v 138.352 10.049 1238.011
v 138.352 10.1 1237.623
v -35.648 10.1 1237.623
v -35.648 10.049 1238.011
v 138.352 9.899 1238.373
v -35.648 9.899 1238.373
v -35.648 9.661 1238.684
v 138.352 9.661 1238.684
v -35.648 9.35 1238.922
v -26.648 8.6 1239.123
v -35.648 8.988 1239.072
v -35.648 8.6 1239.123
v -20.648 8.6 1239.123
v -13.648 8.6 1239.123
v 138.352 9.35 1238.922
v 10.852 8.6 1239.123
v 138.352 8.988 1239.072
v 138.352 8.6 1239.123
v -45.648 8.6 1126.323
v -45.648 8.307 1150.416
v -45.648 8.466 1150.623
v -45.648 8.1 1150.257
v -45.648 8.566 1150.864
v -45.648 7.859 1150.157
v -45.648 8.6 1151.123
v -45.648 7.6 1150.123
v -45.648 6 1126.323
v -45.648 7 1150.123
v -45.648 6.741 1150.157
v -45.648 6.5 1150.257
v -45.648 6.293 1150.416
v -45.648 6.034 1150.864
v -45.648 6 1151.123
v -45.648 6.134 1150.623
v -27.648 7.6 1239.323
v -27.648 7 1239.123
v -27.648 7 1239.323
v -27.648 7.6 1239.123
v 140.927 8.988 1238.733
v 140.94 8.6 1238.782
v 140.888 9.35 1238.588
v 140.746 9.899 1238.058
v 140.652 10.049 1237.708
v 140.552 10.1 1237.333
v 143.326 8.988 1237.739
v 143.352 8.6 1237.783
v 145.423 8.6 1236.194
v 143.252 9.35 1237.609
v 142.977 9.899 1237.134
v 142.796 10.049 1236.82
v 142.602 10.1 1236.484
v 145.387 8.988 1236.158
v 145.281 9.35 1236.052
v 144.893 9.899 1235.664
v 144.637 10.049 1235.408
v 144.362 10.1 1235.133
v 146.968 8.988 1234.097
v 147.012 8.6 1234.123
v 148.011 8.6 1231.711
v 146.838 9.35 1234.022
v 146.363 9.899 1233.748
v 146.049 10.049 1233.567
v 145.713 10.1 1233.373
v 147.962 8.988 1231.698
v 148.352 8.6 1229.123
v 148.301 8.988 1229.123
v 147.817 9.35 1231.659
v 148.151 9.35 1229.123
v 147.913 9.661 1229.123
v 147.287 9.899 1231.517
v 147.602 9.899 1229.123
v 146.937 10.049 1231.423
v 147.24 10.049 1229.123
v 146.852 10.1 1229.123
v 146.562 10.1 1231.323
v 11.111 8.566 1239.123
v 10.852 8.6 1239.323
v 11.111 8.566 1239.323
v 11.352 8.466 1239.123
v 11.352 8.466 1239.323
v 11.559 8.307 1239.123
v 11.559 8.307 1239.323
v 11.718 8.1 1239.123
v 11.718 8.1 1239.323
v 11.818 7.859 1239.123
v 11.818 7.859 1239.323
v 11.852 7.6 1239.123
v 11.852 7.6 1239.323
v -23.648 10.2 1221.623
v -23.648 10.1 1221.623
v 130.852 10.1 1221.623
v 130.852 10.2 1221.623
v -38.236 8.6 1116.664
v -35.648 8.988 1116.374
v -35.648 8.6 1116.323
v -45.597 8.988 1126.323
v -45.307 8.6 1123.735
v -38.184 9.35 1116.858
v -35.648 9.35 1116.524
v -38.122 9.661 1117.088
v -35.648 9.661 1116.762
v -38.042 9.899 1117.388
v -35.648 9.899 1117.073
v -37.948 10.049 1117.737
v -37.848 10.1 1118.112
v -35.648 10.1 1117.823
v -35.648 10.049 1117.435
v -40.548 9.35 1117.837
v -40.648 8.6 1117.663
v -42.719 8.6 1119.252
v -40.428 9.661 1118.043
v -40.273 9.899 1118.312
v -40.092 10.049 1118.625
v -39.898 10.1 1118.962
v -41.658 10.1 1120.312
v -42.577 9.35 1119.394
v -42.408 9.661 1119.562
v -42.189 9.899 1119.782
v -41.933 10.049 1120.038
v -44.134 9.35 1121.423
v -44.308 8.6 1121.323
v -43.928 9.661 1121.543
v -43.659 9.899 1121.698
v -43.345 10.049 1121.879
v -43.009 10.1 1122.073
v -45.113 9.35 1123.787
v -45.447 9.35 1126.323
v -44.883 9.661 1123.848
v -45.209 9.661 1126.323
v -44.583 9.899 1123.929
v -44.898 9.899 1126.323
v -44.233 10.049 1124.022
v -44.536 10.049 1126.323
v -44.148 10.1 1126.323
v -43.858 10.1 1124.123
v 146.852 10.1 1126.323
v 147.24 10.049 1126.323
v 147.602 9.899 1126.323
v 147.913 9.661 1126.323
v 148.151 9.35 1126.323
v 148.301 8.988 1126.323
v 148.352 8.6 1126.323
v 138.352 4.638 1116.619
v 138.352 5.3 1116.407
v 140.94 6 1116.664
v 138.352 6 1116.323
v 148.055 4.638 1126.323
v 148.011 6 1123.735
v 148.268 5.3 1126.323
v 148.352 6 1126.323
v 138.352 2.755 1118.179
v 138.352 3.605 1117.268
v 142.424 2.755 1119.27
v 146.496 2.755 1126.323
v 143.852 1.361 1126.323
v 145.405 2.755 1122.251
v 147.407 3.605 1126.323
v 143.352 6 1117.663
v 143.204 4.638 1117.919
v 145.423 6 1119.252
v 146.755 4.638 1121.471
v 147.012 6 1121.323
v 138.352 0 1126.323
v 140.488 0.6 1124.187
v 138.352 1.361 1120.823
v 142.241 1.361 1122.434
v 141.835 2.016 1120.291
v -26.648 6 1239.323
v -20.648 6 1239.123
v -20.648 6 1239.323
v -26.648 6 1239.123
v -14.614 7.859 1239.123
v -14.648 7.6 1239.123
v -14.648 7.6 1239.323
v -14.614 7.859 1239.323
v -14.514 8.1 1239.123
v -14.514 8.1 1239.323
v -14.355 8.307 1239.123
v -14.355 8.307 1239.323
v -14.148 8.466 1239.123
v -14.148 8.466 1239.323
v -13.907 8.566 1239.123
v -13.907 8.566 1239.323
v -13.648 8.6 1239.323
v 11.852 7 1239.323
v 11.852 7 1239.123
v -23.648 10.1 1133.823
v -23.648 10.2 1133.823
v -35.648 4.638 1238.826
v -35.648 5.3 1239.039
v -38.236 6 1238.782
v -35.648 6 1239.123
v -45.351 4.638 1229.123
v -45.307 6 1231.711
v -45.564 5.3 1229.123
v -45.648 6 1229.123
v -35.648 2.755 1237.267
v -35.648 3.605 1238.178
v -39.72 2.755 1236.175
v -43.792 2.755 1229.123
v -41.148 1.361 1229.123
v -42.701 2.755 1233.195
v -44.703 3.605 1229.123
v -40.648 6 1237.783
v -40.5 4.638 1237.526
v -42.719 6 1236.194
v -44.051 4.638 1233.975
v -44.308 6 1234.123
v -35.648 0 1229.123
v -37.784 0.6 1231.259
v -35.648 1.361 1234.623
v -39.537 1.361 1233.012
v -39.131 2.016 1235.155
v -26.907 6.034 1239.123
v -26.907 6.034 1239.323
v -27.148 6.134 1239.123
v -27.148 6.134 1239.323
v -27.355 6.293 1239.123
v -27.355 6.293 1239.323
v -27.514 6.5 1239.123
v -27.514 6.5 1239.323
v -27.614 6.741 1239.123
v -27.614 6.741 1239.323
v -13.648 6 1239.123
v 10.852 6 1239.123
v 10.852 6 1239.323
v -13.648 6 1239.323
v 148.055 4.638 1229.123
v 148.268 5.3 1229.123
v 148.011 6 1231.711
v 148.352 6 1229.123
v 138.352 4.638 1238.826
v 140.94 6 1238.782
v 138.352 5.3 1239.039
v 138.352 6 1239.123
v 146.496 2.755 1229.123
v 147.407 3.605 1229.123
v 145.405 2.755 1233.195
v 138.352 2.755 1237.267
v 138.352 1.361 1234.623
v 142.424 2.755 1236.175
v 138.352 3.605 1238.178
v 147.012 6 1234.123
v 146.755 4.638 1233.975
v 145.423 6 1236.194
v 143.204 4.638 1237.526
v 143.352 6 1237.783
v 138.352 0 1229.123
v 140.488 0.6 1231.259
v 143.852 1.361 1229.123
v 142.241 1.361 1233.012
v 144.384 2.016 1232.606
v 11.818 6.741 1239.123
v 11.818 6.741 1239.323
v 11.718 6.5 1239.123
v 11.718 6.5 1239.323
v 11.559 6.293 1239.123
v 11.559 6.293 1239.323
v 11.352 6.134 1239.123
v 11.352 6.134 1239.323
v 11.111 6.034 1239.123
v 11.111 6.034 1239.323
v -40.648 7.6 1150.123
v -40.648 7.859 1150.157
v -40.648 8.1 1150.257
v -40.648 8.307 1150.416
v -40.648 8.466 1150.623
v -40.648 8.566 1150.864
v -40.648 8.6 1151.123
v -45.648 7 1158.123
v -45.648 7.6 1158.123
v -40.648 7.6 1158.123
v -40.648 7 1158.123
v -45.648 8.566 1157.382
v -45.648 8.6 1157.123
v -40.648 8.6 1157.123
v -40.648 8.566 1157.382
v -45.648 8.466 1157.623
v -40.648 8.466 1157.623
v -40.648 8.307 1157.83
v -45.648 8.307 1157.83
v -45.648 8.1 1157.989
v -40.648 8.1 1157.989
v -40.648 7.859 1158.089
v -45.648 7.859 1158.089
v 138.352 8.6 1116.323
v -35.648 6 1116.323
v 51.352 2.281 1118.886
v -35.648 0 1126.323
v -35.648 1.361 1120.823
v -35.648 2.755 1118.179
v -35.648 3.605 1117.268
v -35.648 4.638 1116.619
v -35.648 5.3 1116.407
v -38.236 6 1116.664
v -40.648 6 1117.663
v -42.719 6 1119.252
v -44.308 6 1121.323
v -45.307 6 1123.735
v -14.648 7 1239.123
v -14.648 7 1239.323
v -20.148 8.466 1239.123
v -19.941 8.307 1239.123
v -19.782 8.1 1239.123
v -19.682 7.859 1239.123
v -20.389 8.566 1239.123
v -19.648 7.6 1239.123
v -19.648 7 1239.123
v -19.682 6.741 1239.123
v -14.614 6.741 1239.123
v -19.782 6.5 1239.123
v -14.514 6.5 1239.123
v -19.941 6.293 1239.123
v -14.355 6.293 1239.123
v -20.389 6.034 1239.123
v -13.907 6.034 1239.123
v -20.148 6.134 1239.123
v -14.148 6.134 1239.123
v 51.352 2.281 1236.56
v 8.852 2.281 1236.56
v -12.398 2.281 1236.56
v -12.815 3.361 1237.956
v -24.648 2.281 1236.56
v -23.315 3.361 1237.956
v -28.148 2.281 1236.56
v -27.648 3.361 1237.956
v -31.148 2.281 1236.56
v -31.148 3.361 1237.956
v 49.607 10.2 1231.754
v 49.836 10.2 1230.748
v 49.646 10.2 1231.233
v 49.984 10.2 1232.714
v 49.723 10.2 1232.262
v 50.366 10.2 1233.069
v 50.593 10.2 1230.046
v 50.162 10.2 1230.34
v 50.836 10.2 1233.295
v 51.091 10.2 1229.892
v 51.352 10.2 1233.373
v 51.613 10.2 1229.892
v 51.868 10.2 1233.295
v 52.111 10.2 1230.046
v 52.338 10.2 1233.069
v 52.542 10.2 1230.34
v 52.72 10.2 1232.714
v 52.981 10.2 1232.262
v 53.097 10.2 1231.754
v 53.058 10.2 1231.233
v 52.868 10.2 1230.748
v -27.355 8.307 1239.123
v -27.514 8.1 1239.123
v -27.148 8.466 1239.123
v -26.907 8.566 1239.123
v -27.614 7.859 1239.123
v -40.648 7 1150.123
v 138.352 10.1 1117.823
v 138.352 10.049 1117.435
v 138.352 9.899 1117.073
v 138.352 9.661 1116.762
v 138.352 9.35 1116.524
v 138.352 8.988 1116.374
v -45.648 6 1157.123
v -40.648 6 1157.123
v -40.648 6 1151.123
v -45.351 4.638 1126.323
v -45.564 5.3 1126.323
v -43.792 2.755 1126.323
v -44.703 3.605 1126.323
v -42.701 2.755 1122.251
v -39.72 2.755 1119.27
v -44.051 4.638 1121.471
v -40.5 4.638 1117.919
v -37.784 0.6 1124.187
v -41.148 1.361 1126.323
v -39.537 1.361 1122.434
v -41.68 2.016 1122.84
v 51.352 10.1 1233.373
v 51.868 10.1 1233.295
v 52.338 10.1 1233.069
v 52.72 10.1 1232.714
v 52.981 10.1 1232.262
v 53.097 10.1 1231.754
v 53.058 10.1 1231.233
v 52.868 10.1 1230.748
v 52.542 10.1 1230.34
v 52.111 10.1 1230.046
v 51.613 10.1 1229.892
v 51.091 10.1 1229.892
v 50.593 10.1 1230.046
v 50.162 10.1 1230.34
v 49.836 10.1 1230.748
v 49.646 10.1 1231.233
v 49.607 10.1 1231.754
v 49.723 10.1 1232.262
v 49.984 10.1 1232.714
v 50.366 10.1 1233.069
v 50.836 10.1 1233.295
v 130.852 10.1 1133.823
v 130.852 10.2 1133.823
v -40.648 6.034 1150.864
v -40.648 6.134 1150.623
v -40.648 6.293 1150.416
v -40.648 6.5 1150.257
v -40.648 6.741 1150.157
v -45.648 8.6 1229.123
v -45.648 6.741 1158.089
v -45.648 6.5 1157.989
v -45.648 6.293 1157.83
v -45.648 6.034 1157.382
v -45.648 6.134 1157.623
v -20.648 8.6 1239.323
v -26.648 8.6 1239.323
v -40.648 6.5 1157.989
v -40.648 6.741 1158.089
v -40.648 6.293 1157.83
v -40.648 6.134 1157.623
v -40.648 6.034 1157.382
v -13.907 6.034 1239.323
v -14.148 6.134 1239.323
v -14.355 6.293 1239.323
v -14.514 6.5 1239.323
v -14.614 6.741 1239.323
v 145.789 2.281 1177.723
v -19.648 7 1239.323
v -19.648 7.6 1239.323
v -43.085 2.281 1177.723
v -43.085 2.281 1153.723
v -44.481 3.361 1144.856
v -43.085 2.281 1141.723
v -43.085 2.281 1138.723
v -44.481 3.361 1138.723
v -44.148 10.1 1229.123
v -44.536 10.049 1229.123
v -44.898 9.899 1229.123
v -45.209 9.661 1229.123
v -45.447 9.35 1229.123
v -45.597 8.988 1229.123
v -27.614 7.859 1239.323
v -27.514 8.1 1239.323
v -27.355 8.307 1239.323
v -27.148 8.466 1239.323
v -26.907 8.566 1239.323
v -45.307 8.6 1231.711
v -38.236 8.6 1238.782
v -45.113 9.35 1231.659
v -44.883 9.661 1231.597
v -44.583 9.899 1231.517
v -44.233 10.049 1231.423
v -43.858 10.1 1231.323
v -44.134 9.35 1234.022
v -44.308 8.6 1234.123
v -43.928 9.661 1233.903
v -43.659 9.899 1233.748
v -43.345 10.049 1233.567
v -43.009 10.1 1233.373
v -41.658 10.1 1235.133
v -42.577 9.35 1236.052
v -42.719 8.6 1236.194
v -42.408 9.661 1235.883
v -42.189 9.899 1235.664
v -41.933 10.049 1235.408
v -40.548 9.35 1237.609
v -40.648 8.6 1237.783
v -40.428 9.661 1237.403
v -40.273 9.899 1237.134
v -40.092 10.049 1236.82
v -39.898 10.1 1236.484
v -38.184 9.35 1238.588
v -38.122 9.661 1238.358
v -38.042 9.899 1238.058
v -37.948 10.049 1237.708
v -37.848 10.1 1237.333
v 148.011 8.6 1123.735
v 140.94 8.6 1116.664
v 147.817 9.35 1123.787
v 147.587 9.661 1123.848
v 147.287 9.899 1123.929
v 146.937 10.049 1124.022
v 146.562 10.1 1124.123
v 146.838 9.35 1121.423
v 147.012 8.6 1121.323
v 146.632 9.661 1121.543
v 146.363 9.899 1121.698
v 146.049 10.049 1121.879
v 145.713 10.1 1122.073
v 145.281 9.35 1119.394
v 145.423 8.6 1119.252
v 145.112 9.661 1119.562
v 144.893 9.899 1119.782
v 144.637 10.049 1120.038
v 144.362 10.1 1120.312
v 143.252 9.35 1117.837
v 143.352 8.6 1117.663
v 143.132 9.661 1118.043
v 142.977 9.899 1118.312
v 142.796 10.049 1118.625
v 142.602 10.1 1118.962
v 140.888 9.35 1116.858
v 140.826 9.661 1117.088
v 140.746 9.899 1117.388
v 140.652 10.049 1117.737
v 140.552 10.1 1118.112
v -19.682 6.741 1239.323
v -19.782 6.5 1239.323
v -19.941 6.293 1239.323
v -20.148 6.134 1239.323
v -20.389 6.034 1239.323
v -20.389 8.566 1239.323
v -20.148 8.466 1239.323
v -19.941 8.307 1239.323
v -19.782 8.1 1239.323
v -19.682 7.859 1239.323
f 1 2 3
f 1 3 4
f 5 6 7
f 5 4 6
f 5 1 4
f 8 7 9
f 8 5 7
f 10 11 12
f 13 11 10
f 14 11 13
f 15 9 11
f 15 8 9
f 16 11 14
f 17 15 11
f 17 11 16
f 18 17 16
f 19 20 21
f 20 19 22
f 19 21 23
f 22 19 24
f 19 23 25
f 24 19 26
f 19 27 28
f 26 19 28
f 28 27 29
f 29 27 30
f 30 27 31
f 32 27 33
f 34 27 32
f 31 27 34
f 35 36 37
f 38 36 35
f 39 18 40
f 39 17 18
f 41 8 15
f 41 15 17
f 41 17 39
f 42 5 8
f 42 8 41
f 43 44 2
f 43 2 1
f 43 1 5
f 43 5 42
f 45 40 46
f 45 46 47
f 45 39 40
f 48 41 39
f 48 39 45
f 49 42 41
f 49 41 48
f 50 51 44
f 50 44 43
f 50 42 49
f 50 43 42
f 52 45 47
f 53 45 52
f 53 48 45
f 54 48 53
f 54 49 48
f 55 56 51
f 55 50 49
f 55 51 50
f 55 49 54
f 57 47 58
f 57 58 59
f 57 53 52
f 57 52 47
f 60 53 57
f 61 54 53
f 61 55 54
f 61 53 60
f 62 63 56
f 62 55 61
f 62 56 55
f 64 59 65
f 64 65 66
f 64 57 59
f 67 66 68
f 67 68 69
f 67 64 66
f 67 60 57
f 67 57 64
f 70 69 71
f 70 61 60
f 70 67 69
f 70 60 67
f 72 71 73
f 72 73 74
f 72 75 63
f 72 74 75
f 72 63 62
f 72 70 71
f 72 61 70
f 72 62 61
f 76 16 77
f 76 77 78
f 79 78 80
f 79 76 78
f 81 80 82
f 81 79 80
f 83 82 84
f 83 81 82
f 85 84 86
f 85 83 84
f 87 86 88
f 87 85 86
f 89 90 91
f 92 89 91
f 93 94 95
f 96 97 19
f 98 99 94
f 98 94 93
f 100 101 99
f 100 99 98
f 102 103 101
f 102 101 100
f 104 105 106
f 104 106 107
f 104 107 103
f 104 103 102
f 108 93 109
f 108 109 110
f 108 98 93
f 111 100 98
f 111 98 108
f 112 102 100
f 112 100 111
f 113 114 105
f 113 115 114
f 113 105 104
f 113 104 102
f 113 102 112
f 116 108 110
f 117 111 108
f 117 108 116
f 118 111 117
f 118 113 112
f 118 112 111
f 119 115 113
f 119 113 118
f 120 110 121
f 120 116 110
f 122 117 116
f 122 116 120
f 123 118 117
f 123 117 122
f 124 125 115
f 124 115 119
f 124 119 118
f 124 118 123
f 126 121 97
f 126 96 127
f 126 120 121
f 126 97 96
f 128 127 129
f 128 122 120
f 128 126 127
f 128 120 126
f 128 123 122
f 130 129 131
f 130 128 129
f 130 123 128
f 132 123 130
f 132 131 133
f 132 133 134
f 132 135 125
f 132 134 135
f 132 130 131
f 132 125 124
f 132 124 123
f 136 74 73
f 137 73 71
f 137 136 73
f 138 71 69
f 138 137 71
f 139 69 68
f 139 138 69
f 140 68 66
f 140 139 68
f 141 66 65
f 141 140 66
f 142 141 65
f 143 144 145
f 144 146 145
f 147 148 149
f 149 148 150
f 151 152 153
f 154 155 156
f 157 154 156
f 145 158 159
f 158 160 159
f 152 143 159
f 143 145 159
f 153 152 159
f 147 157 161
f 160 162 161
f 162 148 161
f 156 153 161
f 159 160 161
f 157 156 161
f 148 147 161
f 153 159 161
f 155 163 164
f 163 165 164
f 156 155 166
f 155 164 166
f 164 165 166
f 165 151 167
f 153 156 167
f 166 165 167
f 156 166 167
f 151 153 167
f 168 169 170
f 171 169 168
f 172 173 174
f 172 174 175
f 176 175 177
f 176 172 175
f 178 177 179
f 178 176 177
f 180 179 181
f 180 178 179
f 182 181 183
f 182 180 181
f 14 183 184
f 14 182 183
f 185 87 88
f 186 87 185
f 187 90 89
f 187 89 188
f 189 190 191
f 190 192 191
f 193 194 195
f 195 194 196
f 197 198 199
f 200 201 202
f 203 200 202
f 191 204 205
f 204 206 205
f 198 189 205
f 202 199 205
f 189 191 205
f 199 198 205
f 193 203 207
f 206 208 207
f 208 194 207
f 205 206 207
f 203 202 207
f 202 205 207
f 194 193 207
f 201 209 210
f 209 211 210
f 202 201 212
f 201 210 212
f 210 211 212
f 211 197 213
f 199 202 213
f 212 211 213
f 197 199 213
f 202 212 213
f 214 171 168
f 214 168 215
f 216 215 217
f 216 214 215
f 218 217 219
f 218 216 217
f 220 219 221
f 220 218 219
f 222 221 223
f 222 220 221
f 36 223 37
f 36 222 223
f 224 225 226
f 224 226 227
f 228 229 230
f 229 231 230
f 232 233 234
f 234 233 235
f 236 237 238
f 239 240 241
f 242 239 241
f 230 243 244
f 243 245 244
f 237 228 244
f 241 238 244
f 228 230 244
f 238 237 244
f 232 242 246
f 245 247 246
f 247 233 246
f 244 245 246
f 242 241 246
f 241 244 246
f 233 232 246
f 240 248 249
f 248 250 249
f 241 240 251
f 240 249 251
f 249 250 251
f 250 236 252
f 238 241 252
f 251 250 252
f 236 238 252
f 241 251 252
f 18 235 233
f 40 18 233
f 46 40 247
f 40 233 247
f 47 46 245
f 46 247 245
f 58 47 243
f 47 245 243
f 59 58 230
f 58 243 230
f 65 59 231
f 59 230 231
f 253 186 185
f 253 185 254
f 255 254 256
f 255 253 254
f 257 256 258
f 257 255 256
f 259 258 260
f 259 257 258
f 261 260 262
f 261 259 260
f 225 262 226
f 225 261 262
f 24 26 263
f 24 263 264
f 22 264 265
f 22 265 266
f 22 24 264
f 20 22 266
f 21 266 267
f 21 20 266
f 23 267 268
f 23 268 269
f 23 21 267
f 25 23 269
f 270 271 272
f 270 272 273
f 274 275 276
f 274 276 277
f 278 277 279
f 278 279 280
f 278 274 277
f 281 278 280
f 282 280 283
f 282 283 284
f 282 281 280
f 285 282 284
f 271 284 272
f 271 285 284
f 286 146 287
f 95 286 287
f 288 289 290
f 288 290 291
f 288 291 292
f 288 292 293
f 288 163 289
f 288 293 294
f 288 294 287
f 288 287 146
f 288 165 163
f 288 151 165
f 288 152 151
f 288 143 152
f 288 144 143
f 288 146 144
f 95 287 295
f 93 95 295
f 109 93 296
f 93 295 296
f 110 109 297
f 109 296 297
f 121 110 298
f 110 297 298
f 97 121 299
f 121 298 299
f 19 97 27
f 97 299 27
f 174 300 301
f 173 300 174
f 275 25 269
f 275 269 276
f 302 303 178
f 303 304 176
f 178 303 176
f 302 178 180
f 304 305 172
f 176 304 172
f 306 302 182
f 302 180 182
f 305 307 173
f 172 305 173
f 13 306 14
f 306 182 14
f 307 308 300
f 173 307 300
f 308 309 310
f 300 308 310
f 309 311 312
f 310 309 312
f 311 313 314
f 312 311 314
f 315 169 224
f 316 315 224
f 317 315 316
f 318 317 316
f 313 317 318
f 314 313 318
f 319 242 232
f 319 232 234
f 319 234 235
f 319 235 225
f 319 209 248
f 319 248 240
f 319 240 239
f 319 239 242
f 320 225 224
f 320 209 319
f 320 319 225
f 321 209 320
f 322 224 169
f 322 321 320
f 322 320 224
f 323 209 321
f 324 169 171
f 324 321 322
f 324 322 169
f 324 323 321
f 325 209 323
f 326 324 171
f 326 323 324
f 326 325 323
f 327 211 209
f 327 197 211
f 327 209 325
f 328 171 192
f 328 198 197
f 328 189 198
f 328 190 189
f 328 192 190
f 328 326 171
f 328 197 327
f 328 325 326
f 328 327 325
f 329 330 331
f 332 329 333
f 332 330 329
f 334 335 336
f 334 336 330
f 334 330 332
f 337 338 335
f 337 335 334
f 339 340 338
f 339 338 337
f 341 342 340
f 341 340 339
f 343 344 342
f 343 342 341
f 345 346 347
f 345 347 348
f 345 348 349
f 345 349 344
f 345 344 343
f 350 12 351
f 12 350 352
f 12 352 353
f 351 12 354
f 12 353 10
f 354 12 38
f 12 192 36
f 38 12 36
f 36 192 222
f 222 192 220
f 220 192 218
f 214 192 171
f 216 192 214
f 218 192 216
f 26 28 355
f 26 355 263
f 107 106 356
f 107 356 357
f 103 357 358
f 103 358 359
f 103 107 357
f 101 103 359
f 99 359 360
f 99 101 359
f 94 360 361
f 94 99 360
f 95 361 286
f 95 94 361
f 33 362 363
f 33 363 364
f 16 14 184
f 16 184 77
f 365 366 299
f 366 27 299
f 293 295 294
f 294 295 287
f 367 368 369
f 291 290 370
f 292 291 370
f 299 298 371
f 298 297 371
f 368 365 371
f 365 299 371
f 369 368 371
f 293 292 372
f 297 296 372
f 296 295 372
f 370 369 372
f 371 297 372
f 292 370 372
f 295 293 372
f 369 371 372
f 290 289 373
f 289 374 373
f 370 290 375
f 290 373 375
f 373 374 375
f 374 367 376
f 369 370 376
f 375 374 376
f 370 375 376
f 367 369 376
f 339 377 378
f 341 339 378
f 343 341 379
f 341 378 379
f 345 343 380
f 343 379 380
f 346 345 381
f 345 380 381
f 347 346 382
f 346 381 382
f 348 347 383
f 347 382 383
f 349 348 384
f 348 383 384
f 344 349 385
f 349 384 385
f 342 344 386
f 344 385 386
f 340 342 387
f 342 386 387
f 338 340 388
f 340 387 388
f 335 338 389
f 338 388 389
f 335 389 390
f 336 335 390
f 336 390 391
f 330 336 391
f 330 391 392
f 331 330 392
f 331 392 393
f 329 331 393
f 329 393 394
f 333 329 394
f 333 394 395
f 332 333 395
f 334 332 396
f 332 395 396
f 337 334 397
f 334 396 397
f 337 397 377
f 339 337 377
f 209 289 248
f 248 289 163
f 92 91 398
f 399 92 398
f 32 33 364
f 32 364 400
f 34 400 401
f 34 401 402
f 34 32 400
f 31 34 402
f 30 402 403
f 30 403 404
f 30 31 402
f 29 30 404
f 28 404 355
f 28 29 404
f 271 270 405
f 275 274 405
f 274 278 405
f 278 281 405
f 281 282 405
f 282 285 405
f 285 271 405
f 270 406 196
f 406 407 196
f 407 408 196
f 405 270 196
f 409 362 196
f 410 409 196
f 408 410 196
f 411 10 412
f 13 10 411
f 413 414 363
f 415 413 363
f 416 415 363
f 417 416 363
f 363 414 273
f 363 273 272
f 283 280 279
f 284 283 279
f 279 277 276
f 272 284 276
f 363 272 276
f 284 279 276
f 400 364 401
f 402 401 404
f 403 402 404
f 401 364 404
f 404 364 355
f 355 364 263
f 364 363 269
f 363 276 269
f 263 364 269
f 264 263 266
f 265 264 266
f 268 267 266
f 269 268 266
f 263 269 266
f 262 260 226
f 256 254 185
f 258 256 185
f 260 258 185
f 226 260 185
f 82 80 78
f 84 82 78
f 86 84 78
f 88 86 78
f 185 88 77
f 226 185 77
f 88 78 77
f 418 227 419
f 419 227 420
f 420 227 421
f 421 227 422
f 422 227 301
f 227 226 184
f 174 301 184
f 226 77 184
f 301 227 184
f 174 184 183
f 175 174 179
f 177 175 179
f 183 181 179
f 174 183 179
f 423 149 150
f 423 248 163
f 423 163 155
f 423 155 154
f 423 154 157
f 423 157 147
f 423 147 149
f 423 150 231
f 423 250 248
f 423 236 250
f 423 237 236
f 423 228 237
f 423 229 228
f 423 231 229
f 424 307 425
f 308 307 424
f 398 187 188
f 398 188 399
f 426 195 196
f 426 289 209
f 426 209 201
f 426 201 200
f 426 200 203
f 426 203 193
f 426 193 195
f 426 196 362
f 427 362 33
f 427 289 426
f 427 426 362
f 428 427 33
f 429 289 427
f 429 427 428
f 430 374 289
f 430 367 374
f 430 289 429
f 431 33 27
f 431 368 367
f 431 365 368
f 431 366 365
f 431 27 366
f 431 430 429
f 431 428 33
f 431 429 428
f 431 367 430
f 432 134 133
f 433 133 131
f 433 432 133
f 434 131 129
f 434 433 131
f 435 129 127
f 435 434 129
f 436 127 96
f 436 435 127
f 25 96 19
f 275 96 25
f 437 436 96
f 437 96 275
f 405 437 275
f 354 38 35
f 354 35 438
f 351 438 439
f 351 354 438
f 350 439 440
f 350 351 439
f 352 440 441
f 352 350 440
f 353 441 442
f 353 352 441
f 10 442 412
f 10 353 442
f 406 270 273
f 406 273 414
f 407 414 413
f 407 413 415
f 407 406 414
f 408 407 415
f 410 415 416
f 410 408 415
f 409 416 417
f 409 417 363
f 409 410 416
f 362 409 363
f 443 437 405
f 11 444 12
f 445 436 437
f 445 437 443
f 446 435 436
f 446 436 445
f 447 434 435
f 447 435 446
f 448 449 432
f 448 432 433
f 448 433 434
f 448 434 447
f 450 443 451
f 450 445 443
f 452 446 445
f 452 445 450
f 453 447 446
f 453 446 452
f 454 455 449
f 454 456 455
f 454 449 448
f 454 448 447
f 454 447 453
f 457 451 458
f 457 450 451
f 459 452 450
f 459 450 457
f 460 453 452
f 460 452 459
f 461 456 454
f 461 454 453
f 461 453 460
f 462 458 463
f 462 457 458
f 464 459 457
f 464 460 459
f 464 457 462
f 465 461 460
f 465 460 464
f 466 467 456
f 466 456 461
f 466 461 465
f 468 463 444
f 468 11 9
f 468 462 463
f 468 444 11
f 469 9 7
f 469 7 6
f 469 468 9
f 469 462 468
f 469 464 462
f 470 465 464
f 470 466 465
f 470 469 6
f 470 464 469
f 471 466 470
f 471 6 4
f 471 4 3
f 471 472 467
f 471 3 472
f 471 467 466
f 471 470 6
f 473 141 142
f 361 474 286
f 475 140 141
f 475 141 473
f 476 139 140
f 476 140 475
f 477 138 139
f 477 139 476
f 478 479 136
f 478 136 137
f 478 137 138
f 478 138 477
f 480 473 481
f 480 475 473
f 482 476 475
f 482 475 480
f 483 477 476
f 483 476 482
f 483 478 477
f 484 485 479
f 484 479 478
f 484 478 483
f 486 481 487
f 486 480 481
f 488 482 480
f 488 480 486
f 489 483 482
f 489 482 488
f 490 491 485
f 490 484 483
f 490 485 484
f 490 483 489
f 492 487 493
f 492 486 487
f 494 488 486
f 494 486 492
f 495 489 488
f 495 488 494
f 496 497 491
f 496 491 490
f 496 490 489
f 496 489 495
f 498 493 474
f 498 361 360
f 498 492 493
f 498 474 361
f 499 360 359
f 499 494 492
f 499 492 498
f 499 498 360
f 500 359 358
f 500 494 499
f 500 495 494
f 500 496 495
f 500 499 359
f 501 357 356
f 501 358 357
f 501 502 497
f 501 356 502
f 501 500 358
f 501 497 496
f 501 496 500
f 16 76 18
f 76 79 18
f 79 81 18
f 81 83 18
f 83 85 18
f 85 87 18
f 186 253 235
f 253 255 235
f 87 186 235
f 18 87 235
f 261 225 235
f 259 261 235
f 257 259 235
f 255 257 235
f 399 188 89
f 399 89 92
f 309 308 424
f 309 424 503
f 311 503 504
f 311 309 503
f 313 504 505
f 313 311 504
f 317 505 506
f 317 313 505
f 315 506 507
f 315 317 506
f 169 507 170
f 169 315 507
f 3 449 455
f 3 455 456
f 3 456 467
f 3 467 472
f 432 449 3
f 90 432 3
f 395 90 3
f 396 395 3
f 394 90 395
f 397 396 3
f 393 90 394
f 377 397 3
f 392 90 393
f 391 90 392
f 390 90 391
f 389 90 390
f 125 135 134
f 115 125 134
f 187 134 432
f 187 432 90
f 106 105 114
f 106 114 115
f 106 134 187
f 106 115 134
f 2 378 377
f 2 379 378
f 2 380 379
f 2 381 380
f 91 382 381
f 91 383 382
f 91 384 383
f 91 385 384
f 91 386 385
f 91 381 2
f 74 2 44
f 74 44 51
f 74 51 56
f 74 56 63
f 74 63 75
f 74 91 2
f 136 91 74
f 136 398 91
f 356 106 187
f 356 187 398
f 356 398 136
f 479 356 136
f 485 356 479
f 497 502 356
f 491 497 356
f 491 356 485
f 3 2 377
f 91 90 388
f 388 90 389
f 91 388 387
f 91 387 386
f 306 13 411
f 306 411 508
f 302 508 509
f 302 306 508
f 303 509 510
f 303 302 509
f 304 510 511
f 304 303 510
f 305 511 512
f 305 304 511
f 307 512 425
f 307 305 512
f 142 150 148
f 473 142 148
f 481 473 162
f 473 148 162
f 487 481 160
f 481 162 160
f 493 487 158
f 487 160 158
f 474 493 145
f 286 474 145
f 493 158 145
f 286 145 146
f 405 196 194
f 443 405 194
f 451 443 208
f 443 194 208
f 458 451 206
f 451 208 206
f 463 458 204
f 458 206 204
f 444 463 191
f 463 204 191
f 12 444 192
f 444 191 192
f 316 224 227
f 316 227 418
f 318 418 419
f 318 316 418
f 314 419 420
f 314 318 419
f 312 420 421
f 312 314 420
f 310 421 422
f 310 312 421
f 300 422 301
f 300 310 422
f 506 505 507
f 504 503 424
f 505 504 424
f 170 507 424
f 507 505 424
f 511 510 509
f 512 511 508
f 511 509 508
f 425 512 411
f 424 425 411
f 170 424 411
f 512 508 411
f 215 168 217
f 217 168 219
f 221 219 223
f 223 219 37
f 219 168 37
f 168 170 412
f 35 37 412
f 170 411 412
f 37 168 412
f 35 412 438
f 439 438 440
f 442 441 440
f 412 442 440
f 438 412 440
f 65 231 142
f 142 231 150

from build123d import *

# Parameters (mm, degrees)
DODANIE_WYCI_GNI_CIE1_DEPTH = 10.1
DODANIE_WYCI_GNI_CIE2_DEPTH = 0.2
DODANIE_WYCI_GNI_CIE3_DEPTH = 0.2
WYTNIJ_WYCI_GNI_CIE1_DEPTH  = 5
SZKIC10_W                   = 154.5
SZKIC10_H                   = 87.8
DODANIE_WYCI_GNI_CIE4_DEPTH = 0.1
SZKIC9_R                    = 1.75
DODANIE_WYCI_GNI_CIE5_DEPTH = 0.1


with BuildPart() as part:
    # Szkic1 → Dodanie-wyciągnięcie1 (new body)
    with BuildSketch(Plane(origin=(0, 0, 0), x_dir=(1, 0, 0), z_dir=(0, 1, 0))):
        with BuildLine():
            Line((-45.648009954, -1126.322861225), (-45.648009954, -1229.122861225))
            ThreePointArc((-45.648009954, -1229.122861225), (-42.719077766, -1236.193929037), (-35.648009954, -1239.122861225))
            Line((-35.648009954, -1239.122861225), (138.351990046, -1239.122861225))
            ThreePointArc((138.351990046, -1239.122861225), (145.423057858, -1236.193929037), (148.351990046, -1229.122861225))
            Line((148.351990046, -1229.122861225), (148.351990046, -1126.322861225))
            ThreePointArc((148.351990046, -1126.322861225), (145.423057858, -1119.251793413), (138.351990046, -1116.322861225))
            Line((138.351990046, -1116.322861225), (-35.648009954, -1116.322861225))
            ThreePointArc((-35.648009954, -1116.322861225), (-42.719077766, -1119.251793413), (-45.648009954, -1126.322861225))
        make_face()
    extrude(amount=DODANIE_WYCI_GNI_CIE1_DEPTH)

    # Wycięcie-wyciągnięcie po ścieżce1: sweep along a path in Szkic3
    with BuildLine(Plane(origin=(0, 10.1, 0), x_dir=(1, 0, 0), z_dir=(0, 1, 0))) as wyci_cie_wyci_gni_cie_po_cie_ce1_path:
        Line((138.351990046, -1116.322861225), (-35.648009954, -1116.322861225))
        ThreePointArc((-35.648009954, -1116.322861225), (-42.719077766, -1119.251793413), (-45.648009954, -1126.322861225))
        Line((-45.648009954, -1126.322861225), (-45.648009954, -1229.122861225))
        ThreePointArc((-45.648009954, -1229.122861225), (-42.719077766, -1236.193929037), (-35.648009954, -1239.122861225))
        Line((-35.648009954, -1239.122861225), (138.351990046, -1239.122861225))
        ThreePointArc((138.351990046, -1239.122861225), (145.423057858, -1236.193929037), (148.351990046, -1229.122861225))
        Line((148.351990046, -1229.122861225), (148.351990046, -1126.322861225))
        ThreePointArc((148.351990046, -1126.322861225), (145.423057858, -1119.251793413), (138.351990046, -1116.322861225))
    # Szkic2 → Wycięcie-wyciągnięcie po ścieżce1 (sweep, cut)
    with BuildSketch(Plane.ZY.offset(35.648009954)):
        with BuildLine():
            Line((1116.322861225, 10.1), (1116.322861225, 8.6))
            ThreePointArc((1116.322861225, 8.6), (1116.762201053, 9.660660172), (1117.822861225, 10.1))
            Line((1117.822861225, 10.1), (1116.322861225, 10.1))
        make_face()
    sweep(path=wyci_cie_wyci_gni_cie_po_cie_ce1_path.line, mode=Mode.SUBTRACT)

    # Wycięcie-wyciągnięcie po ścieżce2: sweep along a path in Szkic4
    with BuildLine(Plane.XZ) as wyci_cie_wyci_gni_cie_po_cie_ce2_path:
        Line((138.351990046, 1239.122861225), (-35.648009954, 1239.122861225))
        ThreePointArc((-35.648009954, 1239.122861225), (-42.719077766, 1236.193929037), (-45.648009954, 1229.122861225))
        Line((-45.648009954, 1229.122861225), (-45.648009954, 1126.322861225))
        ThreePointArc((-45.648009954, 1126.322861225), (-42.719077766, 1119.251793413), (-35.648009954, 1116.322861225))
        Line((-35.648009954, 1116.322861225), (138.351990046, 1116.322861225))
        ThreePointArc((138.351990046, 1116.322861225), (145.423057858, 1119.251793413), (148.351990046, 1126.322861225))
        Line((148.351990046, 1126.322861225), (148.351990046, 1229.122861225))
        ThreePointArc((148.351990046, 1229.122861225), (145.423057858, 1236.193929037), (138.351990046, 1239.122861225))
    # Szkic5 → Wycięcie-wyciągnięcie po ścieżce2 (sweep, cut)
    with BuildSketch(Plane.ZY.offset(35.648009954)):
        with BuildLine():
            Line((1116.322861225, 0), (1116.322861225, 6))
            add(Edge.make_bspline(
                [(1116.322861225, 6), (1116.448621512, 1.561373174), (1126.322861225, 0)],
                knots=[0, 0, 0, 1, 1, 1], degree=2))
            Line((1126.322861225, 0), (1116.322861225, 0))
        make_face()
    sweep(path=wyci_cie_wyci_gni_cie_po_cie_ce2_path.line, mode=Mode.SUBTRACT)

    # Szkic6 → Dodanie-wyciągnięcie2 (add)
    with BuildSketch(Plane.XY.offset(1239.122861225)):
        with BuildLine():
            Line((-26.648009954, 8.6), (-20.648009954, 8.6))
            ThreePointArc((-20.648009954, 8.6), (-19.940903173, 8.307106781), (-19.648009954, 7.6))
            Line((-19.648009954, 7.6), (-19.648009954, 7))
            ThreePointArc((-19.648009954, 7), (-19.940903173, 6.292893219), (-20.648009954, 6))
            Line((-20.648009954, 6), (-26.648009954, 6))
            ThreePointArc((-26.648009954, 6), (-27.355116735, 6.292893219), (-27.648009954, 7))
            Line((-27.648009954, 7), (-27.648009954, 7.6))
            ThreePointArc((-27.648009954, 7.6), (-27.355116735, 8.307106781), (-26.648009954, 8.6))
        make_face()
    extrude(amount=DODANIE_WYCI_GNI_CIE2_DEPTH)

    # Szkic7 → Dodanie-wyciągnięcie3 (add)
    with BuildSketch(Plane.XY.offset(1239.122861225)):
        with BuildLine():
            Line((-13.648009954, 8.6), (10.851990046, 8.6))
            ThreePointArc((10.851990046, 8.6), (11.559096827, 8.307106781), (11.851990046, 7.6))
            Line((11.851990046, 7.6), (11.851990046, 7))
            ThreePointArc((11.851990046, 7), (11.559096827, 6.292893219), (10.851990046, 6))
            Line((10.851990046, 6), (-13.648009954, 6))
            ThreePointArc((-13.648009954, 6), (-14.355116735, 6.292893219), (-14.648009954, 7))
            Line((-14.648009954, 7), (-14.648009954, 7.6))
            ThreePointArc((-14.648009954, 7.6), (-14.355116735, 8.307106781), (-13.648009954, 8.6))
        make_face()
    extrude(amount=DODANIE_WYCI_GNI_CIE3_DEPTH)

    # Szkic8 → Wytnij-wyciągnięcie1 (cut)
    with BuildSketch(Plane.ZY.offset(45.648009954)):
        with BuildLine():
            Line((1151.122861225, 8.6), (1157.122861225, 8.6))
            ThreePointArc((1157.122861225, 8.6), (1157.829968006, 8.307106781), (1158.122861225, 7.6))
            Line((1158.122861225, 7.6), (1158.122861225, 7))
            ThreePointArc((1158.122861225, 7), (1157.829968006, 6.292893219), (1157.122861225, 6))
            Line((1157.122861225, 6), (1151.122861225, 6))
            ThreePointArc((1151.122861225, 6), (1150.415754444, 6.292893219), (1150.122861225, 7))
            Line((1150.122861225, 7), (1150.122861225, 7.6))
            ThreePointArc((1150.122861225, 7.6), (1150.415754444, 8.307106781), (1151.122861225, 8.6))
        make_face()
    extrude(amount=-WYTNIJ_WYCI_GNI_CIE1_DEPTH, mode=Mode.SUBTRACT)

    # Szkic10 → Dodanie-wyciągnięcie4 (add)
    with BuildSketch(Plane(origin=(0, 10.1, 0), x_dir=(1, 0, 0), z_dir=(0, 1, 0))):
        with Locations((53.601990046, -1177.722861225)):
            Rectangle(SZKIC10_W, SZKIC10_H)
    extrude(amount=DODANIE_WYCI_GNI_CIE4_DEPTH)

    # Szkic9 → Dodanie-wyciągnięcie5 (add)
    with BuildSketch(Plane(origin=(0, 10.1, 0), x_dir=(1, 0, 0), z_dir=(0, 1, 0))):
        with Locations(Location((51.351990046, -1231.622861225, 0), (0, 0, 270))):
            Circle(SZKIC9_R)
    extrude(amount=DODANIE_WYCI_GNI_CIE5_DEPTH)


solid = part.part
